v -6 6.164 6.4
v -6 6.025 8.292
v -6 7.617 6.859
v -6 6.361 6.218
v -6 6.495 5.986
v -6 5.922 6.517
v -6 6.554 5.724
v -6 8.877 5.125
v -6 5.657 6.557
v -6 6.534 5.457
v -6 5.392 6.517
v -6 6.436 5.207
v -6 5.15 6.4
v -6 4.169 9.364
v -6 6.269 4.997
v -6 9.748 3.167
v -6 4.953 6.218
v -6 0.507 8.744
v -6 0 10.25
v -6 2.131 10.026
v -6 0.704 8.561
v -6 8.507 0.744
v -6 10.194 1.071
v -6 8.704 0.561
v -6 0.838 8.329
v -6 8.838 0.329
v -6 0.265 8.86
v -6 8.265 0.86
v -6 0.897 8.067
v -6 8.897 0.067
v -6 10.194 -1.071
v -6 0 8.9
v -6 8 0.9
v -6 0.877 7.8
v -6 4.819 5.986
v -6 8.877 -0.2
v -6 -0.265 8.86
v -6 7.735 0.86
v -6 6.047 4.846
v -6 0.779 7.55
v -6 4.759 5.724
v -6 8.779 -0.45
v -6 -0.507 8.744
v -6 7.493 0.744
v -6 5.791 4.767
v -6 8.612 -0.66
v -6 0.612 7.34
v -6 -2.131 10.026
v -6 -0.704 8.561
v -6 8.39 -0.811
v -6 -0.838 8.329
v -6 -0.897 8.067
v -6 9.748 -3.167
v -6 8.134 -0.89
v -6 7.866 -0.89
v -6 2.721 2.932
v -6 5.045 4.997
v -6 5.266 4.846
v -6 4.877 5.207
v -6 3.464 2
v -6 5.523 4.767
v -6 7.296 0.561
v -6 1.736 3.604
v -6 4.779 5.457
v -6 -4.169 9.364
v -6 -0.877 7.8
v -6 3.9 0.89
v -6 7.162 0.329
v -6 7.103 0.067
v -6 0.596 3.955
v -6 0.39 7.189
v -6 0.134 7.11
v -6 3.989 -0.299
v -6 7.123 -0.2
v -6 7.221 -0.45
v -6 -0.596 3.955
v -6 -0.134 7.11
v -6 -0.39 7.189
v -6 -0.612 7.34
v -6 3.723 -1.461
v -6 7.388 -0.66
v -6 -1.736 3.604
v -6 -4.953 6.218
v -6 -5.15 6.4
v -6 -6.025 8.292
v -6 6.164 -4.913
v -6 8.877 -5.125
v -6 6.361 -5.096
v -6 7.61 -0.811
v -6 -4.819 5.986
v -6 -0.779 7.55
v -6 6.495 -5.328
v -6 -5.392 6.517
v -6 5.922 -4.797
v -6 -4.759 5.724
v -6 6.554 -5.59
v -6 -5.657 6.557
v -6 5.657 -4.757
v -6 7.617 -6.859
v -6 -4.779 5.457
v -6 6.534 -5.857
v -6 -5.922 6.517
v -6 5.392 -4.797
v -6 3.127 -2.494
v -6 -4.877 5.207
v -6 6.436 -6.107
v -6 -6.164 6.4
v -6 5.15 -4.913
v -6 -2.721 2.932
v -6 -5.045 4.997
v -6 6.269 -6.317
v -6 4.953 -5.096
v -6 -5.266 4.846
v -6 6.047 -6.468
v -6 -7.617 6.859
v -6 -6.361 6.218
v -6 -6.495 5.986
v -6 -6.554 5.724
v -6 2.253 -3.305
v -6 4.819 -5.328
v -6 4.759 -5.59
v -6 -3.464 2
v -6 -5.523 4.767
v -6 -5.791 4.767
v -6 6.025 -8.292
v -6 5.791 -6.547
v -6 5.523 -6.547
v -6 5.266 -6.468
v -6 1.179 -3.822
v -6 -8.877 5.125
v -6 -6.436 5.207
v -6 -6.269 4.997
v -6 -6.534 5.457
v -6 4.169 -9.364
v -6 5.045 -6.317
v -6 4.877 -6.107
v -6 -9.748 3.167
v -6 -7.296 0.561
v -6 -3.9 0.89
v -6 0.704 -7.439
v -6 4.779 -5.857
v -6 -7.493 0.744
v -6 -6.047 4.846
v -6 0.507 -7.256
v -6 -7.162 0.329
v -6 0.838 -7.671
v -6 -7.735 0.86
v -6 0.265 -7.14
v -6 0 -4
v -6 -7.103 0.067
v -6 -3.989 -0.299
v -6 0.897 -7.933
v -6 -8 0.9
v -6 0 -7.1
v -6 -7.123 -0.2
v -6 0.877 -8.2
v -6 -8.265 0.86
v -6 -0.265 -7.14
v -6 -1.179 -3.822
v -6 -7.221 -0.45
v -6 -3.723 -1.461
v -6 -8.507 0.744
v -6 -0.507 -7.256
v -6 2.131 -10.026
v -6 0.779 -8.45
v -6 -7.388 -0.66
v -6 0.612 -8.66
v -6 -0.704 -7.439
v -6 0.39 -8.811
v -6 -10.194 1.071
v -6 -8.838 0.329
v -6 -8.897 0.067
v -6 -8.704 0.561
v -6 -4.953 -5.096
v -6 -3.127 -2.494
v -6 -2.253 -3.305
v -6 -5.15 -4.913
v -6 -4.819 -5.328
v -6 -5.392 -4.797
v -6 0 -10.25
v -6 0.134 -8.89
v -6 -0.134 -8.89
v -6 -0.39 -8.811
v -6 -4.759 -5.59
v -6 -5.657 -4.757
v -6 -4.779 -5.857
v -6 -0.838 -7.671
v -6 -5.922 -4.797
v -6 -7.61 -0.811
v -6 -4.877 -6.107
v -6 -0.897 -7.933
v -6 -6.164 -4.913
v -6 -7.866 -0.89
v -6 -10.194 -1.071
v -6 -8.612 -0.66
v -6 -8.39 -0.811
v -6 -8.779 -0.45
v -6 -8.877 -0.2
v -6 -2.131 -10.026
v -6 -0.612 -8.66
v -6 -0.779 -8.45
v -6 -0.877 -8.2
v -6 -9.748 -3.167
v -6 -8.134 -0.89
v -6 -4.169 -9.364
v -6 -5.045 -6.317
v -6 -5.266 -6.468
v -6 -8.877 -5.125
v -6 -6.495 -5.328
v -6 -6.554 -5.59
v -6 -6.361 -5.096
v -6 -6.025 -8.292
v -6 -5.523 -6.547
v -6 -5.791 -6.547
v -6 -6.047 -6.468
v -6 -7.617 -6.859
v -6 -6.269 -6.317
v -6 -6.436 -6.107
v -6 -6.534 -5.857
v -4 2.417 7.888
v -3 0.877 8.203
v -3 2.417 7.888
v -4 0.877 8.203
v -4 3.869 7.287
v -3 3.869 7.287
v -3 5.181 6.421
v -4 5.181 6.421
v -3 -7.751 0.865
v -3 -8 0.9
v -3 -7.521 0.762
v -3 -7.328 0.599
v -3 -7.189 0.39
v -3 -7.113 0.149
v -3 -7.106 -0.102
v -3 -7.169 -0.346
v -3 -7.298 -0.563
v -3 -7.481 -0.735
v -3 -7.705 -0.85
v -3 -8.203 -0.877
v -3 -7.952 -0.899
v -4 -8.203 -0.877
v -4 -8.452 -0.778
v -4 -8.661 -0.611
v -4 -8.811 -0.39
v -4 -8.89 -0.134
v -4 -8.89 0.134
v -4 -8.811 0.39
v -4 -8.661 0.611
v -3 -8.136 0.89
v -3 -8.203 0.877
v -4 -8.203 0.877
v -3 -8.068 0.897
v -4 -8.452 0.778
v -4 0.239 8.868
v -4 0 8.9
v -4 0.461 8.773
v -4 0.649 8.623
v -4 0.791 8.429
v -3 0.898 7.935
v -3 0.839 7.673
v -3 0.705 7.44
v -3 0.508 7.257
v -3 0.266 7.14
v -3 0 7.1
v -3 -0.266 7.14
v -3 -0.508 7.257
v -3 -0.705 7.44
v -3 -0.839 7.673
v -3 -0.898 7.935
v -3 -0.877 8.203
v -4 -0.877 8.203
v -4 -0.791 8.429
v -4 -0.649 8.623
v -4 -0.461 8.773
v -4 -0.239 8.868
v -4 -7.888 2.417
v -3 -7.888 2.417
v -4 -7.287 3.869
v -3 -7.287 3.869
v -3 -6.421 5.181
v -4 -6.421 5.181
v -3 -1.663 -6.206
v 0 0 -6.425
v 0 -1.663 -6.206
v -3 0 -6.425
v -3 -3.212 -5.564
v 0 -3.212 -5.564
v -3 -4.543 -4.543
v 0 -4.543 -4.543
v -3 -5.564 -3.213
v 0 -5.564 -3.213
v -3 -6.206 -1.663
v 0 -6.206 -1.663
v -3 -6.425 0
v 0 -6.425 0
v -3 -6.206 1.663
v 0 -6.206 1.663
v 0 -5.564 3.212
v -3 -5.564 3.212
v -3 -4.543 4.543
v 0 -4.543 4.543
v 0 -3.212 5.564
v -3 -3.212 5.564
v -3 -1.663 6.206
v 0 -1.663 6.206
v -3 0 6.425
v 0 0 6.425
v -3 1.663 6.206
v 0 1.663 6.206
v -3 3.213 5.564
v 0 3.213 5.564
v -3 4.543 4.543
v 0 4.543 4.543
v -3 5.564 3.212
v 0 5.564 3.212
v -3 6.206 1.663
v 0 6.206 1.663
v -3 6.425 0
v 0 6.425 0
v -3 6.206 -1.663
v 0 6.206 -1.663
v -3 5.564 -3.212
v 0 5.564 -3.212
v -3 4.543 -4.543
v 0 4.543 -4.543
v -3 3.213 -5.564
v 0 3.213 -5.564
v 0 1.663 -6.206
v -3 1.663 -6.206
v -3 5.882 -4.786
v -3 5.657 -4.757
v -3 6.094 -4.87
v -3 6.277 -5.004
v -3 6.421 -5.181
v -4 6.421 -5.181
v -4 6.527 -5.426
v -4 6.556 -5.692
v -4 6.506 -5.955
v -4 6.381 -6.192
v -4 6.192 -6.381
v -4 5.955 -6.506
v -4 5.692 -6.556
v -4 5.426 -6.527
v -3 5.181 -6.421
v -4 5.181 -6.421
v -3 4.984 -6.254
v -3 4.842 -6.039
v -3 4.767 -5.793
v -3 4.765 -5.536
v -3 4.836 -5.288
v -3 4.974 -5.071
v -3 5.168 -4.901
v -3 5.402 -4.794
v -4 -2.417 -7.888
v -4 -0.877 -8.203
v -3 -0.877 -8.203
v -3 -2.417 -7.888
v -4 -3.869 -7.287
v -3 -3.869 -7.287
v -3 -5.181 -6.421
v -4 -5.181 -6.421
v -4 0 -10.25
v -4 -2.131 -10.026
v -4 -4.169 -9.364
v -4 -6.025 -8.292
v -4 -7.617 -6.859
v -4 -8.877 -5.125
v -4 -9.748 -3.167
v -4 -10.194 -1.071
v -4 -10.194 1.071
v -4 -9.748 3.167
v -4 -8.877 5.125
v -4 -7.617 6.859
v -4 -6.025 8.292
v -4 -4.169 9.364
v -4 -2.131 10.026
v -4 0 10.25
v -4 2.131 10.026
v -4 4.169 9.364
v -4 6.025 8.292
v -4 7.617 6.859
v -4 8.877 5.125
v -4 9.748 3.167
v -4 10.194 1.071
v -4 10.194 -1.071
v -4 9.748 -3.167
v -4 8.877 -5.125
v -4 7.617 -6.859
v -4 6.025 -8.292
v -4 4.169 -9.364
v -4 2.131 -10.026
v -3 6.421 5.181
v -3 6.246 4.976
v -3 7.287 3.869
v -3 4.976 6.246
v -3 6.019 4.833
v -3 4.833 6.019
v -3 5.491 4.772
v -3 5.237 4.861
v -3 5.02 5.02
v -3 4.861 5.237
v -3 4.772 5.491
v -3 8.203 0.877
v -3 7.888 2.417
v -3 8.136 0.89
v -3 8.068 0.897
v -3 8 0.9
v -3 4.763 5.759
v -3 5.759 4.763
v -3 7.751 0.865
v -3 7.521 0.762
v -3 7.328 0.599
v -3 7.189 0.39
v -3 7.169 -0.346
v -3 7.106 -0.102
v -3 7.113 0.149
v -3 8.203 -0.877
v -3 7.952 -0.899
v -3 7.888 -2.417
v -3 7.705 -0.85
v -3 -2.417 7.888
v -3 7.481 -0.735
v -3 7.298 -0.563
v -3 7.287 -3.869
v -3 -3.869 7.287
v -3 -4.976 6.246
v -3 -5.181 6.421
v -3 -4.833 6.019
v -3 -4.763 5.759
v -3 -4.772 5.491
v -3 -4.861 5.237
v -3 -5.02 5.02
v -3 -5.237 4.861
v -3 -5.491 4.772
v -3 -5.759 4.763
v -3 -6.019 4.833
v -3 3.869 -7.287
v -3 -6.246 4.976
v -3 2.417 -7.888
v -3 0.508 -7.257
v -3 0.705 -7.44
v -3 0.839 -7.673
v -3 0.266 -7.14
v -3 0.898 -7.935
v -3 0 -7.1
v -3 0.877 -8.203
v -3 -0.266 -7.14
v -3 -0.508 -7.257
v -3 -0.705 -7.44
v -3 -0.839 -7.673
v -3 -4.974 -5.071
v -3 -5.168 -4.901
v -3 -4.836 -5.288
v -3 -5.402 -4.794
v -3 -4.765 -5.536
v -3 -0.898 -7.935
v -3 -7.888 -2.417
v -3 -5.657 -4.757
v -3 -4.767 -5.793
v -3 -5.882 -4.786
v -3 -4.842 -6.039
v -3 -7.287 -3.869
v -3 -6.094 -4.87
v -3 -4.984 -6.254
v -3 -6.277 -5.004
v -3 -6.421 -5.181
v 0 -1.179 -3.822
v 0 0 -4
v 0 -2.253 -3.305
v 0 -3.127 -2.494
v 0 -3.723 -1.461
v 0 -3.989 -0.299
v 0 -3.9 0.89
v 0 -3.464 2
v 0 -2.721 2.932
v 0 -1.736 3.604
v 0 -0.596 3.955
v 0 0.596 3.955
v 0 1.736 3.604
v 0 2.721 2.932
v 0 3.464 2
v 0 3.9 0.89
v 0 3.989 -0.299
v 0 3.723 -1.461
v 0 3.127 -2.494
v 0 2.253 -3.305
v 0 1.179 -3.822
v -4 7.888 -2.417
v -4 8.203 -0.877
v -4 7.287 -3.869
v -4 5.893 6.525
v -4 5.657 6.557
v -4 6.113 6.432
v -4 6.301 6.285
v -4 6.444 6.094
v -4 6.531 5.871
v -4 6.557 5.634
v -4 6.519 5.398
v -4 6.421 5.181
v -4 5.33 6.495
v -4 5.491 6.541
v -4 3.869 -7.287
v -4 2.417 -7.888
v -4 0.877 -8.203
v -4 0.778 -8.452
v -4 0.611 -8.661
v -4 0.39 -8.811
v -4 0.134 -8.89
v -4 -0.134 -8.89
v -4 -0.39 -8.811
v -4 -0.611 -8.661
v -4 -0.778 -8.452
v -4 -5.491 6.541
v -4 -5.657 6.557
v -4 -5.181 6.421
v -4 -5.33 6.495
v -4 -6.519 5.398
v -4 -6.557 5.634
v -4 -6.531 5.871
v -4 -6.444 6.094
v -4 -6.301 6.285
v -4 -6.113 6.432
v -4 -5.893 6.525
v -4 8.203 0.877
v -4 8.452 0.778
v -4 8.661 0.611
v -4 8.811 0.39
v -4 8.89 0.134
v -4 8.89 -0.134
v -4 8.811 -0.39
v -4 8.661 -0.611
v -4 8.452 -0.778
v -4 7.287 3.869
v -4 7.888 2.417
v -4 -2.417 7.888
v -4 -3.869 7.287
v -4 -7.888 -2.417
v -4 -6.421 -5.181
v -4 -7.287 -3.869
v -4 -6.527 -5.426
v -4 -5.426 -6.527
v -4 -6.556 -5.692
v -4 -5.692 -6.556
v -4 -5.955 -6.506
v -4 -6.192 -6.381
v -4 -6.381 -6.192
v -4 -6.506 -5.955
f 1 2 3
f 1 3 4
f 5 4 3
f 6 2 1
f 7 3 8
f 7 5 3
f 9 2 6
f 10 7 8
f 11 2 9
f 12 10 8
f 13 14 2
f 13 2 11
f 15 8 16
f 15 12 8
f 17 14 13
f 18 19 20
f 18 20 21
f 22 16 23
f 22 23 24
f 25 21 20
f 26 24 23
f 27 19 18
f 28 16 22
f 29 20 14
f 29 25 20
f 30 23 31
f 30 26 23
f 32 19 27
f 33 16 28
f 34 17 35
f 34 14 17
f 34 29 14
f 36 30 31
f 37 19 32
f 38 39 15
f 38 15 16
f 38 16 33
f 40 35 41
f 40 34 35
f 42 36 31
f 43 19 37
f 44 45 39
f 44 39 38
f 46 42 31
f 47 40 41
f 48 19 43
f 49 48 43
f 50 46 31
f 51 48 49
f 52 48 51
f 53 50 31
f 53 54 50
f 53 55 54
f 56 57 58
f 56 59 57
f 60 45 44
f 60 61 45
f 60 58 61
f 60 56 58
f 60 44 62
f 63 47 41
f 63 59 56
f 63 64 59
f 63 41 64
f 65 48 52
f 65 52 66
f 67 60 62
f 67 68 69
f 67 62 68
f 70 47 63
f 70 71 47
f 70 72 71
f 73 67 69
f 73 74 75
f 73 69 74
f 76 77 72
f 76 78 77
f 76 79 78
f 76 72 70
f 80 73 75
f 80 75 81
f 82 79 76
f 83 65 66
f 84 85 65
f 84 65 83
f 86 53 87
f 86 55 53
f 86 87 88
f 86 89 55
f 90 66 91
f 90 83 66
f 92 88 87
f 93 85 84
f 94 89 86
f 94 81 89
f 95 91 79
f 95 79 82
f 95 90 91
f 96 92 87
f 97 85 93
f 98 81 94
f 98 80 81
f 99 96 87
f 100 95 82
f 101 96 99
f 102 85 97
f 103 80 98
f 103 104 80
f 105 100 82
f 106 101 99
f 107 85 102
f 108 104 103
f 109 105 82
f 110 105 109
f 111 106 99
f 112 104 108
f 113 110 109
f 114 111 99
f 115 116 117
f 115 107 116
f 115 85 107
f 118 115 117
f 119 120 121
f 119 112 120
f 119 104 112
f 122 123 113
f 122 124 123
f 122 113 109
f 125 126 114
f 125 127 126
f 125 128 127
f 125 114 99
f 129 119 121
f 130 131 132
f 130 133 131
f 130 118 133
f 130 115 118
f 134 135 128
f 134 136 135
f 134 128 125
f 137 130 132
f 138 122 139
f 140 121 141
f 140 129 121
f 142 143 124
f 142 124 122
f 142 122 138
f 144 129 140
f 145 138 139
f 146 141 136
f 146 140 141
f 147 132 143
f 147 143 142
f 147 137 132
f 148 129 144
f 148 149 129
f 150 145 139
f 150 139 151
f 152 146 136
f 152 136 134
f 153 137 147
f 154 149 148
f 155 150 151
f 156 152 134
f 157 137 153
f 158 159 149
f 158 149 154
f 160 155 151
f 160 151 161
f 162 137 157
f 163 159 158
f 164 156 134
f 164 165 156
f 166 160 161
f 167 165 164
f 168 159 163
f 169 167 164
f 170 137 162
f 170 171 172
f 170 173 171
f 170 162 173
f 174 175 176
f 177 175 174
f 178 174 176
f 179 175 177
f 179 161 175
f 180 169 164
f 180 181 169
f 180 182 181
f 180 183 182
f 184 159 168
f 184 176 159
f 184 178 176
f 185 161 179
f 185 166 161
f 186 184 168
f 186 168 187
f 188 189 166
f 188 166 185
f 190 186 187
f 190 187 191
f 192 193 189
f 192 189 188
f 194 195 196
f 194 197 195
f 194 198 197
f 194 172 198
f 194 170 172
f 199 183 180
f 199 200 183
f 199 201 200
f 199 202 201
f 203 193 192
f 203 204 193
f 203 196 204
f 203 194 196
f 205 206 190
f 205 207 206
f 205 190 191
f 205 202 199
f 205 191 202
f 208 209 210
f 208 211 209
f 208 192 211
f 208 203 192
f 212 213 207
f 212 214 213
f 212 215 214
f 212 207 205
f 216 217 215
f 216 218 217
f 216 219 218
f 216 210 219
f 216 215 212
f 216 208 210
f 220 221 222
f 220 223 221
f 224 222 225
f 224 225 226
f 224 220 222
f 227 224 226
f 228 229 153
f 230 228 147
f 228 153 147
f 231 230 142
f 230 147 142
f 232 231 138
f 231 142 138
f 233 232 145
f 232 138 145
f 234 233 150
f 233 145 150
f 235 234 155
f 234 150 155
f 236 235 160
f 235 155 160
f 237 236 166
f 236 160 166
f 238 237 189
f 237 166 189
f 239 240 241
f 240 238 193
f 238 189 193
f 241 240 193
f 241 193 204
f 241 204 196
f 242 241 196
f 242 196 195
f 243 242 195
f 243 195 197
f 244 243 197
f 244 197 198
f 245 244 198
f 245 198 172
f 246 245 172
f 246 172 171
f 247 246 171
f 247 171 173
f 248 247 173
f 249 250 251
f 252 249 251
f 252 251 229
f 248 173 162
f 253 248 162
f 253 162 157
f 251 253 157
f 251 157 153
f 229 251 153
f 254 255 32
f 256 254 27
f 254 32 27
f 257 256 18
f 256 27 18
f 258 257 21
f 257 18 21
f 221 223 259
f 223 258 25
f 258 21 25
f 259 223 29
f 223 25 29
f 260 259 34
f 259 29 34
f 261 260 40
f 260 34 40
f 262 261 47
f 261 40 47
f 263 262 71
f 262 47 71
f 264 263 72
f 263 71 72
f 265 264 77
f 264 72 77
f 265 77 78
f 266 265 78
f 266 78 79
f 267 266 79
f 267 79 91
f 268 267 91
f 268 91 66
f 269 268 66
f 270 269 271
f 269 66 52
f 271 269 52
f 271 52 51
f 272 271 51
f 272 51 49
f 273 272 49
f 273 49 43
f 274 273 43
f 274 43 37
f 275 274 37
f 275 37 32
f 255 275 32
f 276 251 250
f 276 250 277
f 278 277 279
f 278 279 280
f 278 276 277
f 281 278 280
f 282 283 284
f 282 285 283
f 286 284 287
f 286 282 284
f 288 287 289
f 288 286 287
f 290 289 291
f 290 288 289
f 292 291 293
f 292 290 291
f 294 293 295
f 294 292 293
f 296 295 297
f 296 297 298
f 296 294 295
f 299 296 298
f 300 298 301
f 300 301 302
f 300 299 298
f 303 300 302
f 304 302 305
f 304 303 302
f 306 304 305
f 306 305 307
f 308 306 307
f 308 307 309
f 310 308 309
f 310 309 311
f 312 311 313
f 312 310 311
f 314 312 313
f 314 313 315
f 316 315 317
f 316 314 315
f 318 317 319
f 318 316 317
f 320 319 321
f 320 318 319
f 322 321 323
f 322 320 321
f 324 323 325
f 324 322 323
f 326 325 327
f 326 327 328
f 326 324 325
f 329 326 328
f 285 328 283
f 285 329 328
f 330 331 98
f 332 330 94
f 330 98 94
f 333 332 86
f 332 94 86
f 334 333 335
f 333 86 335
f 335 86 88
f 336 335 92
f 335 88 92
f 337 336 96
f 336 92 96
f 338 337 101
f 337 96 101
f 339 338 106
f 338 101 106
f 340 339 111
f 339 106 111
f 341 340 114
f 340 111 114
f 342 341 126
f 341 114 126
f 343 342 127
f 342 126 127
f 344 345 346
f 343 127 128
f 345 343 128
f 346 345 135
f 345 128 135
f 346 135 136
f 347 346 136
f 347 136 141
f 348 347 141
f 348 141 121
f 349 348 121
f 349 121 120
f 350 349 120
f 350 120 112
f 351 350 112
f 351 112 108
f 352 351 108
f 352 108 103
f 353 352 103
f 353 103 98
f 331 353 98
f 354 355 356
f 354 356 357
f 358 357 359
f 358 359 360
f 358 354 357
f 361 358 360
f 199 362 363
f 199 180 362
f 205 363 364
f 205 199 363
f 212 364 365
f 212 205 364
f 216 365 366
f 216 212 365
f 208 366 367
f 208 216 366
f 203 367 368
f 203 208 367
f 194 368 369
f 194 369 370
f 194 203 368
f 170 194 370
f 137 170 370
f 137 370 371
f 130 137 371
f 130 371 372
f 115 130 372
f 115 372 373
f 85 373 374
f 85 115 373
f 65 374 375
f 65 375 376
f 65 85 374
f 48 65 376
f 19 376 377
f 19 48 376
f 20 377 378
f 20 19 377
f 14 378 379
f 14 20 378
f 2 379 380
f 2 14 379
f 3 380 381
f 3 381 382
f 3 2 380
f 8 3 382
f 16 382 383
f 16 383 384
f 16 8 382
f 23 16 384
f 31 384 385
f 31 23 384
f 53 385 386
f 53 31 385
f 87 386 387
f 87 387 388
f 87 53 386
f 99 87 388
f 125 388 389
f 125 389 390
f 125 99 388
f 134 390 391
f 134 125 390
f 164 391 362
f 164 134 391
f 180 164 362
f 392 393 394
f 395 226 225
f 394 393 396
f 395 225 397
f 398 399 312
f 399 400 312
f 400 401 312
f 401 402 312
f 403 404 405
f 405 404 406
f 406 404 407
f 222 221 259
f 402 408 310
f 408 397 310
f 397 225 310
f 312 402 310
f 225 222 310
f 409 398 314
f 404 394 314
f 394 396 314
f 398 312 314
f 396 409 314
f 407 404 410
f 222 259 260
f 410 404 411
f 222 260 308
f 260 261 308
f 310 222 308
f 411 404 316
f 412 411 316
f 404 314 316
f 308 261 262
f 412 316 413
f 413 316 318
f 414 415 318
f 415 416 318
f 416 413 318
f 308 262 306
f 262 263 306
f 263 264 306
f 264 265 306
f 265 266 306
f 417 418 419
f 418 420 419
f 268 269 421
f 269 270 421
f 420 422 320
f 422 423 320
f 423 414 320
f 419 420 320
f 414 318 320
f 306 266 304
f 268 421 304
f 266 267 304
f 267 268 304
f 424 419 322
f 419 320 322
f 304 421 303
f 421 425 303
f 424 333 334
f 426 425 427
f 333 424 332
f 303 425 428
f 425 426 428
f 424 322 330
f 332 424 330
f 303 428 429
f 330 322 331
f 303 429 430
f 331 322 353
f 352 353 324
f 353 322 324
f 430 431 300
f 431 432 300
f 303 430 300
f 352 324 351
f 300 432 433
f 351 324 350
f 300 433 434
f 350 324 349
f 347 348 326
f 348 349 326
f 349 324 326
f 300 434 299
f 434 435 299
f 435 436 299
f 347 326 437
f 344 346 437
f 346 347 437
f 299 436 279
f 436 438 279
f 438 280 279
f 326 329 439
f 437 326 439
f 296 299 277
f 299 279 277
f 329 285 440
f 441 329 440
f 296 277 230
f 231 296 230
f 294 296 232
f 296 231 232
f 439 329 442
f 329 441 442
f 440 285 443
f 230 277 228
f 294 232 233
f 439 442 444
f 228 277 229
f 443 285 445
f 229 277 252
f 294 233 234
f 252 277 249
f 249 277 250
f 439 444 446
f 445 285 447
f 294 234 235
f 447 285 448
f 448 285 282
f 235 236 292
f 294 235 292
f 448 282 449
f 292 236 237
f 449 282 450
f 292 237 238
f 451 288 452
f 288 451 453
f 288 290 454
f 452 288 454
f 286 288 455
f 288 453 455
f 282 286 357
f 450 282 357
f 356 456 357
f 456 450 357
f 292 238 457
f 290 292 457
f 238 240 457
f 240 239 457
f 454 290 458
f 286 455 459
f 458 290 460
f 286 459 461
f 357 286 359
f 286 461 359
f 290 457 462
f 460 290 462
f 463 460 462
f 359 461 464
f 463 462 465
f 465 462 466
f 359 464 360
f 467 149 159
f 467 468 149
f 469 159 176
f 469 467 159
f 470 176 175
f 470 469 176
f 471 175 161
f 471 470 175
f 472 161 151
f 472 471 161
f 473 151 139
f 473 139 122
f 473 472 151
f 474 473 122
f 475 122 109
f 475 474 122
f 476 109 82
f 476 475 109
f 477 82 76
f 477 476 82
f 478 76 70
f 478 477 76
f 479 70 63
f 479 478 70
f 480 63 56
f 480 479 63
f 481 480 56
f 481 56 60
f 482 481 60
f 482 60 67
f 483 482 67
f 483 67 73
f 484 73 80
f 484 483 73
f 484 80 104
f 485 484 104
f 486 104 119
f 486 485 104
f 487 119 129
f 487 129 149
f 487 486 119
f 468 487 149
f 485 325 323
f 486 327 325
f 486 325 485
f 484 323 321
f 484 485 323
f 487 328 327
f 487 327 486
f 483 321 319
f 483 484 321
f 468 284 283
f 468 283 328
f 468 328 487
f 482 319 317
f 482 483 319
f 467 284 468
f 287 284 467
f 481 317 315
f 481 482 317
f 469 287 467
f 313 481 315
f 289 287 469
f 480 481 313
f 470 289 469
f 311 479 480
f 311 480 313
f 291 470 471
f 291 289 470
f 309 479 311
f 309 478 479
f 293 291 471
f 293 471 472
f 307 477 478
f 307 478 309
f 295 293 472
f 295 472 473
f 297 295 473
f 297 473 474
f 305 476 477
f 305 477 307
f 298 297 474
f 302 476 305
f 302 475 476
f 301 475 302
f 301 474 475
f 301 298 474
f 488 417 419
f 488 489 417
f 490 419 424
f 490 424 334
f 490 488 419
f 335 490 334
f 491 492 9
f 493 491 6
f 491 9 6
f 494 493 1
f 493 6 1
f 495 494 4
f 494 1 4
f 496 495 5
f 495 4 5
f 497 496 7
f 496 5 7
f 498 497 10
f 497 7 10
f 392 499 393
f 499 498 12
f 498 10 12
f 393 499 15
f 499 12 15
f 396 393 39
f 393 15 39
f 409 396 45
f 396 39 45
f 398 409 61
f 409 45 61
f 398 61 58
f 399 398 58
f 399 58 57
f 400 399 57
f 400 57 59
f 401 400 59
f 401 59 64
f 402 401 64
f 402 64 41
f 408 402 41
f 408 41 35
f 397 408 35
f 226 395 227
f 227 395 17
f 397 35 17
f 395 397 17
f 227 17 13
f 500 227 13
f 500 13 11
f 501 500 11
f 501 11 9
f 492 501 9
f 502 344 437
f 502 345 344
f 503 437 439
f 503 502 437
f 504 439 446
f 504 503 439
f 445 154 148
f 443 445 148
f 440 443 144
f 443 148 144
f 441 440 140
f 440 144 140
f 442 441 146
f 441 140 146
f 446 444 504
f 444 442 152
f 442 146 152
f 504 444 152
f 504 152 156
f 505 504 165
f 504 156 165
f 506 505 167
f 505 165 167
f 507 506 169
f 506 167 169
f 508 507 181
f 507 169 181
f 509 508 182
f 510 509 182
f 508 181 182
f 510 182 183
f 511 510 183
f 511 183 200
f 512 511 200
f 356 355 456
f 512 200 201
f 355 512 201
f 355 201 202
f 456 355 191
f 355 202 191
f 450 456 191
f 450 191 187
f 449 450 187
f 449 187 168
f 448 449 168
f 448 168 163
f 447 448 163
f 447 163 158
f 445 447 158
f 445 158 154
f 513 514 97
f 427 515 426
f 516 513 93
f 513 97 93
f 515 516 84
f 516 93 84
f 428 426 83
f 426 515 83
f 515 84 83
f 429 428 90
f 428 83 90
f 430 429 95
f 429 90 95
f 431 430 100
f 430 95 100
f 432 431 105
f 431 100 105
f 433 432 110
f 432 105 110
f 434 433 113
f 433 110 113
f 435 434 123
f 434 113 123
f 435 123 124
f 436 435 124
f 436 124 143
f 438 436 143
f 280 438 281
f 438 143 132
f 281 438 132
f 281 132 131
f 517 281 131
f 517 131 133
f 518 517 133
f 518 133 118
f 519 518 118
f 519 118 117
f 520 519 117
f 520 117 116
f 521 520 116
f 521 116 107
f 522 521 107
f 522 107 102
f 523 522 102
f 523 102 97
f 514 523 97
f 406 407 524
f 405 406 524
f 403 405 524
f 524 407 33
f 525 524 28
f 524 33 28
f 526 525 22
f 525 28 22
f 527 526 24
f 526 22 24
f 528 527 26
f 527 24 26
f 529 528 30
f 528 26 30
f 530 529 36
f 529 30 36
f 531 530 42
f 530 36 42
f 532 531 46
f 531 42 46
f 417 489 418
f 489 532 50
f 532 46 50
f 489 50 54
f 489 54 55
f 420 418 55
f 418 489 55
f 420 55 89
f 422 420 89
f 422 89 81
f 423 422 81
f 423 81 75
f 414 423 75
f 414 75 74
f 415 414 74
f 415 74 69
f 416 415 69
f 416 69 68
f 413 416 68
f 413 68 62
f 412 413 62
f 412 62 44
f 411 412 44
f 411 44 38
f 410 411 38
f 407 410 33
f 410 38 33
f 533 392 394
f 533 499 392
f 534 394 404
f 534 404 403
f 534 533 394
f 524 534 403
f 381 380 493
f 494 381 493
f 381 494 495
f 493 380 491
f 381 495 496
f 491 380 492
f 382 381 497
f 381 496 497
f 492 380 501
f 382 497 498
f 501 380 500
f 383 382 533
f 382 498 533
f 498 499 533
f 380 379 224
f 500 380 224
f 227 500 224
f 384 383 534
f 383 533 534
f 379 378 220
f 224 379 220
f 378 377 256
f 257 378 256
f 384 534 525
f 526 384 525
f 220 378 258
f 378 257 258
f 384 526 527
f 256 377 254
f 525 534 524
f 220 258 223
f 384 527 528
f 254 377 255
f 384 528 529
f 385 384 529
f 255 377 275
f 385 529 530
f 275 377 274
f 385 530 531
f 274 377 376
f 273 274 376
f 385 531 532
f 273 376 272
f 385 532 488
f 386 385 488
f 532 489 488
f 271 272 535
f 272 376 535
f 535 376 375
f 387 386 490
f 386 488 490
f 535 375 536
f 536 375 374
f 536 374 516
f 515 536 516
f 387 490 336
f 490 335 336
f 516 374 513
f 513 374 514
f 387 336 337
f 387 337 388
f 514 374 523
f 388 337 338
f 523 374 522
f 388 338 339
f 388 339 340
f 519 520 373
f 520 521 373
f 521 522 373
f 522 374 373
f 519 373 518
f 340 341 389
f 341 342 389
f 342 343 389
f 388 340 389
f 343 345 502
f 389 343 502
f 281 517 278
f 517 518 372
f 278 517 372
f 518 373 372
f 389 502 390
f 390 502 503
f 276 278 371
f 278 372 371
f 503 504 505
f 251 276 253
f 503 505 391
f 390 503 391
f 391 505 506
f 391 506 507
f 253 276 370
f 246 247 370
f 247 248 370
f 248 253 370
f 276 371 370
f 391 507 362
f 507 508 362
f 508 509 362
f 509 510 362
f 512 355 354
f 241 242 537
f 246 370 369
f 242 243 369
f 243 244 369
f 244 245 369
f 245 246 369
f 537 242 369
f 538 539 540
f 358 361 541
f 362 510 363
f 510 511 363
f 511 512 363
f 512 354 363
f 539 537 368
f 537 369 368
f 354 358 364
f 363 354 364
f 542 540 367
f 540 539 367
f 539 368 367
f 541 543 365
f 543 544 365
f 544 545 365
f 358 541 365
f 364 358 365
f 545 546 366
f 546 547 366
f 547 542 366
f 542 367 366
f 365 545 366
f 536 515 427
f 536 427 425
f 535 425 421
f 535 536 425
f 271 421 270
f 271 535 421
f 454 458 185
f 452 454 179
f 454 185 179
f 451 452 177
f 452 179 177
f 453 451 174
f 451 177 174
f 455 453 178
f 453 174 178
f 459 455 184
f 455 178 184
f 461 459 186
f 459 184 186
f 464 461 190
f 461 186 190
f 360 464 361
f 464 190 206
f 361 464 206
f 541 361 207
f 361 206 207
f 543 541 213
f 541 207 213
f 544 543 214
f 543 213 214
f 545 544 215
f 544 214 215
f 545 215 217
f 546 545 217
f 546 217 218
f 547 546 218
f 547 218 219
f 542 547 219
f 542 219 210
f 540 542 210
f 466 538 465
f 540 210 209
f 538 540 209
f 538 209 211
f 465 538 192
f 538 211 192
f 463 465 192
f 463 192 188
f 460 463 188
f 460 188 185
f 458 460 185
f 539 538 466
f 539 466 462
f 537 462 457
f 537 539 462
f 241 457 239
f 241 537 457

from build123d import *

# Parameters (mm, degrees)
MOVE_FACE1_BY      = 0.075
MOVE_FACE2_BY      = 0.25
SKETCH2_R          = 0.9
CUT_EXTRUDE1_DEPTH = 16.68837149


with BuildPart() as part:
    # Sketch1 → Revolve1 (revolve)
    with BuildSketch(Plane.XY, mode=Mode.PRIVATE) as revolve1_sk:
        Polygon((0, 4), (0, 6.5), (-3, 6.5), (-3, 8.5), (-4, 8.5), (-4, 10.25), (-6, 10.25), (-6, 4), align=None)
    revolve(revolve1_sk.sketch.rotate(Axis((0, 0, 0), (-1, 0, 0)), 90), axis=Axis((0, 0, 0), (-1, 0, 0)))

    # Move Face1: a curved face moved inward by 0.075
    add(Solid.thicken(part.faces().sort_by_distance((-1.5, 0, 6.5))[0], -MOVE_FACE1_BY), mode=Mode.SUBTRACT)

    # Move Face2: a curved face moved inward by 0.25
    add(Solid.thicken(part.faces().sort_by_distance((-3.5, 0, 8.5))[0], -MOVE_FACE2_BY), mode=Mode.SUBTRACT)

    # Sketch2 → Cut-Extrude1 (cut, through all)
    with BuildSketch(Plane.ZY.offset(6)):
        with Locations((0, 8)):
            Circle(SKETCH2_R)
        with Locations((5.656854249, 5.656854249)):
            Circle(SKETCH2_R)
        with Locations((8, 0)):
            Circle(SKETCH2_R)
        with Locations((5.656854249, -5.656854249)):
            Circle(SKETCH2_R)
        with Locations((0, -8)):
            Circle(SKETCH2_R)
        with Locations((-5.656854249, -5.656854249)):
            Circle(SKETCH2_R)
        with Locations((-8, 0)):
            Circle(SKETCH2_R)
        with Locations((-5.656854249, 5.656854249)):
            Circle(SKETCH2_R)
    extrude(amount=-CUT_EXTRUDE1_DEPTH, mode=Mode.SUBTRACT)


solid = part.part
